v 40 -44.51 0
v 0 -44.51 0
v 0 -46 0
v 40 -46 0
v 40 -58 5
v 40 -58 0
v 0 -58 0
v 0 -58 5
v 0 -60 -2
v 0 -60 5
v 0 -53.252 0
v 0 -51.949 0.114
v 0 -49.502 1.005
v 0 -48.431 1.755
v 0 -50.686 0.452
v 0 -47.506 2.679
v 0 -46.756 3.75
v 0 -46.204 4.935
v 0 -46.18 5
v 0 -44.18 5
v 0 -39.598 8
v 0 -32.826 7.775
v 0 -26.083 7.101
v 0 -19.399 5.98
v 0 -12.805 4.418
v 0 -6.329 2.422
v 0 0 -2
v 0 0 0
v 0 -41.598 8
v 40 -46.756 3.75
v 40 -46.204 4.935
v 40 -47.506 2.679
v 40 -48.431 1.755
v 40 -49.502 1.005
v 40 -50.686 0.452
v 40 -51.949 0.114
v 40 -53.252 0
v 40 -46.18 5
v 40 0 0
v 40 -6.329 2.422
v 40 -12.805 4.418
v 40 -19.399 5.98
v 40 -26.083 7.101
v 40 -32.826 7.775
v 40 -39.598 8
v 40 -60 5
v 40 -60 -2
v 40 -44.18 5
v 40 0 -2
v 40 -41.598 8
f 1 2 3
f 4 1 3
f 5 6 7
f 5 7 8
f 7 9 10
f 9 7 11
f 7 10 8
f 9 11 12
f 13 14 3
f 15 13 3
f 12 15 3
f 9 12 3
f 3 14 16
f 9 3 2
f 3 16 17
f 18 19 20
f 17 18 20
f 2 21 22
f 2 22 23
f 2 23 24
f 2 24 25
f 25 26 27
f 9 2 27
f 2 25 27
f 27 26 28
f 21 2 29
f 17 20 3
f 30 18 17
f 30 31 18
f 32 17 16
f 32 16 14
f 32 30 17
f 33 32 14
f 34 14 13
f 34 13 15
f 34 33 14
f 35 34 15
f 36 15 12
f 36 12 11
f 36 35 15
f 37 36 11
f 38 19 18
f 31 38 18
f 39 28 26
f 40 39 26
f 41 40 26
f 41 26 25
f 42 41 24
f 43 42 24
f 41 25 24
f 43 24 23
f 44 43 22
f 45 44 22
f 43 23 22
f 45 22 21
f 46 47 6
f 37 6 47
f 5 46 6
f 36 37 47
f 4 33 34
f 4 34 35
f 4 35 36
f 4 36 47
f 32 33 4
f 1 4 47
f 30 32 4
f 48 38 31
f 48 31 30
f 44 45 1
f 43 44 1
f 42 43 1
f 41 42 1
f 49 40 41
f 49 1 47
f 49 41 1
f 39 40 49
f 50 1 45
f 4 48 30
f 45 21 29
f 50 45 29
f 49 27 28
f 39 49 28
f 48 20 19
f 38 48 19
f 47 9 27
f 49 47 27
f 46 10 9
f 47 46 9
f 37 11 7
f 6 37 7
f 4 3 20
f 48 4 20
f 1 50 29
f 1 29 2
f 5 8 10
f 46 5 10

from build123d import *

# Parameters (mm, degrees)
F1_DEPTH = 40
F2_R     = 7.5


with BuildPart() as f1:
    # F0 (on Right) → F1 (new body)
    with BuildSketch(Plane.YZ):
        with BuildLine():
            Line((0, -2), (0, 0))
            ThreePointArc((0, 0), (-19.399179, 5.979998), (-39.598389, 8))
            Line((-39.598389, 8), (-41.598389, 8))
            Line((-41.598389, 8), (-44.510151, 0))
            Line((-44.510151, 0), (-46, 0))
            Line((-46, 0), (-44.180149, 5))
            Line((-44.180149, 5), (-46.180149, 5))
            Line((-46.180149, 5), (-48, 0))
            Line((-48, 0), (-58, 0))
            Line((-58, 0), (-58, 5))
            Line((-58, 5), (-60, 5))
            Line((-60, 5), (-60, -2))
            Line((-60, -2), (0, -2))
        make_face()
    extrude(amount=F1_DEPTH)

    # F2
    f2_edges = [f1.edges().sort_by_distance(p)[0] for p in [
        (20, -48, 0),
    ]]
    fillet(f2_edges, radius=F2_R)


solid = f1.part
